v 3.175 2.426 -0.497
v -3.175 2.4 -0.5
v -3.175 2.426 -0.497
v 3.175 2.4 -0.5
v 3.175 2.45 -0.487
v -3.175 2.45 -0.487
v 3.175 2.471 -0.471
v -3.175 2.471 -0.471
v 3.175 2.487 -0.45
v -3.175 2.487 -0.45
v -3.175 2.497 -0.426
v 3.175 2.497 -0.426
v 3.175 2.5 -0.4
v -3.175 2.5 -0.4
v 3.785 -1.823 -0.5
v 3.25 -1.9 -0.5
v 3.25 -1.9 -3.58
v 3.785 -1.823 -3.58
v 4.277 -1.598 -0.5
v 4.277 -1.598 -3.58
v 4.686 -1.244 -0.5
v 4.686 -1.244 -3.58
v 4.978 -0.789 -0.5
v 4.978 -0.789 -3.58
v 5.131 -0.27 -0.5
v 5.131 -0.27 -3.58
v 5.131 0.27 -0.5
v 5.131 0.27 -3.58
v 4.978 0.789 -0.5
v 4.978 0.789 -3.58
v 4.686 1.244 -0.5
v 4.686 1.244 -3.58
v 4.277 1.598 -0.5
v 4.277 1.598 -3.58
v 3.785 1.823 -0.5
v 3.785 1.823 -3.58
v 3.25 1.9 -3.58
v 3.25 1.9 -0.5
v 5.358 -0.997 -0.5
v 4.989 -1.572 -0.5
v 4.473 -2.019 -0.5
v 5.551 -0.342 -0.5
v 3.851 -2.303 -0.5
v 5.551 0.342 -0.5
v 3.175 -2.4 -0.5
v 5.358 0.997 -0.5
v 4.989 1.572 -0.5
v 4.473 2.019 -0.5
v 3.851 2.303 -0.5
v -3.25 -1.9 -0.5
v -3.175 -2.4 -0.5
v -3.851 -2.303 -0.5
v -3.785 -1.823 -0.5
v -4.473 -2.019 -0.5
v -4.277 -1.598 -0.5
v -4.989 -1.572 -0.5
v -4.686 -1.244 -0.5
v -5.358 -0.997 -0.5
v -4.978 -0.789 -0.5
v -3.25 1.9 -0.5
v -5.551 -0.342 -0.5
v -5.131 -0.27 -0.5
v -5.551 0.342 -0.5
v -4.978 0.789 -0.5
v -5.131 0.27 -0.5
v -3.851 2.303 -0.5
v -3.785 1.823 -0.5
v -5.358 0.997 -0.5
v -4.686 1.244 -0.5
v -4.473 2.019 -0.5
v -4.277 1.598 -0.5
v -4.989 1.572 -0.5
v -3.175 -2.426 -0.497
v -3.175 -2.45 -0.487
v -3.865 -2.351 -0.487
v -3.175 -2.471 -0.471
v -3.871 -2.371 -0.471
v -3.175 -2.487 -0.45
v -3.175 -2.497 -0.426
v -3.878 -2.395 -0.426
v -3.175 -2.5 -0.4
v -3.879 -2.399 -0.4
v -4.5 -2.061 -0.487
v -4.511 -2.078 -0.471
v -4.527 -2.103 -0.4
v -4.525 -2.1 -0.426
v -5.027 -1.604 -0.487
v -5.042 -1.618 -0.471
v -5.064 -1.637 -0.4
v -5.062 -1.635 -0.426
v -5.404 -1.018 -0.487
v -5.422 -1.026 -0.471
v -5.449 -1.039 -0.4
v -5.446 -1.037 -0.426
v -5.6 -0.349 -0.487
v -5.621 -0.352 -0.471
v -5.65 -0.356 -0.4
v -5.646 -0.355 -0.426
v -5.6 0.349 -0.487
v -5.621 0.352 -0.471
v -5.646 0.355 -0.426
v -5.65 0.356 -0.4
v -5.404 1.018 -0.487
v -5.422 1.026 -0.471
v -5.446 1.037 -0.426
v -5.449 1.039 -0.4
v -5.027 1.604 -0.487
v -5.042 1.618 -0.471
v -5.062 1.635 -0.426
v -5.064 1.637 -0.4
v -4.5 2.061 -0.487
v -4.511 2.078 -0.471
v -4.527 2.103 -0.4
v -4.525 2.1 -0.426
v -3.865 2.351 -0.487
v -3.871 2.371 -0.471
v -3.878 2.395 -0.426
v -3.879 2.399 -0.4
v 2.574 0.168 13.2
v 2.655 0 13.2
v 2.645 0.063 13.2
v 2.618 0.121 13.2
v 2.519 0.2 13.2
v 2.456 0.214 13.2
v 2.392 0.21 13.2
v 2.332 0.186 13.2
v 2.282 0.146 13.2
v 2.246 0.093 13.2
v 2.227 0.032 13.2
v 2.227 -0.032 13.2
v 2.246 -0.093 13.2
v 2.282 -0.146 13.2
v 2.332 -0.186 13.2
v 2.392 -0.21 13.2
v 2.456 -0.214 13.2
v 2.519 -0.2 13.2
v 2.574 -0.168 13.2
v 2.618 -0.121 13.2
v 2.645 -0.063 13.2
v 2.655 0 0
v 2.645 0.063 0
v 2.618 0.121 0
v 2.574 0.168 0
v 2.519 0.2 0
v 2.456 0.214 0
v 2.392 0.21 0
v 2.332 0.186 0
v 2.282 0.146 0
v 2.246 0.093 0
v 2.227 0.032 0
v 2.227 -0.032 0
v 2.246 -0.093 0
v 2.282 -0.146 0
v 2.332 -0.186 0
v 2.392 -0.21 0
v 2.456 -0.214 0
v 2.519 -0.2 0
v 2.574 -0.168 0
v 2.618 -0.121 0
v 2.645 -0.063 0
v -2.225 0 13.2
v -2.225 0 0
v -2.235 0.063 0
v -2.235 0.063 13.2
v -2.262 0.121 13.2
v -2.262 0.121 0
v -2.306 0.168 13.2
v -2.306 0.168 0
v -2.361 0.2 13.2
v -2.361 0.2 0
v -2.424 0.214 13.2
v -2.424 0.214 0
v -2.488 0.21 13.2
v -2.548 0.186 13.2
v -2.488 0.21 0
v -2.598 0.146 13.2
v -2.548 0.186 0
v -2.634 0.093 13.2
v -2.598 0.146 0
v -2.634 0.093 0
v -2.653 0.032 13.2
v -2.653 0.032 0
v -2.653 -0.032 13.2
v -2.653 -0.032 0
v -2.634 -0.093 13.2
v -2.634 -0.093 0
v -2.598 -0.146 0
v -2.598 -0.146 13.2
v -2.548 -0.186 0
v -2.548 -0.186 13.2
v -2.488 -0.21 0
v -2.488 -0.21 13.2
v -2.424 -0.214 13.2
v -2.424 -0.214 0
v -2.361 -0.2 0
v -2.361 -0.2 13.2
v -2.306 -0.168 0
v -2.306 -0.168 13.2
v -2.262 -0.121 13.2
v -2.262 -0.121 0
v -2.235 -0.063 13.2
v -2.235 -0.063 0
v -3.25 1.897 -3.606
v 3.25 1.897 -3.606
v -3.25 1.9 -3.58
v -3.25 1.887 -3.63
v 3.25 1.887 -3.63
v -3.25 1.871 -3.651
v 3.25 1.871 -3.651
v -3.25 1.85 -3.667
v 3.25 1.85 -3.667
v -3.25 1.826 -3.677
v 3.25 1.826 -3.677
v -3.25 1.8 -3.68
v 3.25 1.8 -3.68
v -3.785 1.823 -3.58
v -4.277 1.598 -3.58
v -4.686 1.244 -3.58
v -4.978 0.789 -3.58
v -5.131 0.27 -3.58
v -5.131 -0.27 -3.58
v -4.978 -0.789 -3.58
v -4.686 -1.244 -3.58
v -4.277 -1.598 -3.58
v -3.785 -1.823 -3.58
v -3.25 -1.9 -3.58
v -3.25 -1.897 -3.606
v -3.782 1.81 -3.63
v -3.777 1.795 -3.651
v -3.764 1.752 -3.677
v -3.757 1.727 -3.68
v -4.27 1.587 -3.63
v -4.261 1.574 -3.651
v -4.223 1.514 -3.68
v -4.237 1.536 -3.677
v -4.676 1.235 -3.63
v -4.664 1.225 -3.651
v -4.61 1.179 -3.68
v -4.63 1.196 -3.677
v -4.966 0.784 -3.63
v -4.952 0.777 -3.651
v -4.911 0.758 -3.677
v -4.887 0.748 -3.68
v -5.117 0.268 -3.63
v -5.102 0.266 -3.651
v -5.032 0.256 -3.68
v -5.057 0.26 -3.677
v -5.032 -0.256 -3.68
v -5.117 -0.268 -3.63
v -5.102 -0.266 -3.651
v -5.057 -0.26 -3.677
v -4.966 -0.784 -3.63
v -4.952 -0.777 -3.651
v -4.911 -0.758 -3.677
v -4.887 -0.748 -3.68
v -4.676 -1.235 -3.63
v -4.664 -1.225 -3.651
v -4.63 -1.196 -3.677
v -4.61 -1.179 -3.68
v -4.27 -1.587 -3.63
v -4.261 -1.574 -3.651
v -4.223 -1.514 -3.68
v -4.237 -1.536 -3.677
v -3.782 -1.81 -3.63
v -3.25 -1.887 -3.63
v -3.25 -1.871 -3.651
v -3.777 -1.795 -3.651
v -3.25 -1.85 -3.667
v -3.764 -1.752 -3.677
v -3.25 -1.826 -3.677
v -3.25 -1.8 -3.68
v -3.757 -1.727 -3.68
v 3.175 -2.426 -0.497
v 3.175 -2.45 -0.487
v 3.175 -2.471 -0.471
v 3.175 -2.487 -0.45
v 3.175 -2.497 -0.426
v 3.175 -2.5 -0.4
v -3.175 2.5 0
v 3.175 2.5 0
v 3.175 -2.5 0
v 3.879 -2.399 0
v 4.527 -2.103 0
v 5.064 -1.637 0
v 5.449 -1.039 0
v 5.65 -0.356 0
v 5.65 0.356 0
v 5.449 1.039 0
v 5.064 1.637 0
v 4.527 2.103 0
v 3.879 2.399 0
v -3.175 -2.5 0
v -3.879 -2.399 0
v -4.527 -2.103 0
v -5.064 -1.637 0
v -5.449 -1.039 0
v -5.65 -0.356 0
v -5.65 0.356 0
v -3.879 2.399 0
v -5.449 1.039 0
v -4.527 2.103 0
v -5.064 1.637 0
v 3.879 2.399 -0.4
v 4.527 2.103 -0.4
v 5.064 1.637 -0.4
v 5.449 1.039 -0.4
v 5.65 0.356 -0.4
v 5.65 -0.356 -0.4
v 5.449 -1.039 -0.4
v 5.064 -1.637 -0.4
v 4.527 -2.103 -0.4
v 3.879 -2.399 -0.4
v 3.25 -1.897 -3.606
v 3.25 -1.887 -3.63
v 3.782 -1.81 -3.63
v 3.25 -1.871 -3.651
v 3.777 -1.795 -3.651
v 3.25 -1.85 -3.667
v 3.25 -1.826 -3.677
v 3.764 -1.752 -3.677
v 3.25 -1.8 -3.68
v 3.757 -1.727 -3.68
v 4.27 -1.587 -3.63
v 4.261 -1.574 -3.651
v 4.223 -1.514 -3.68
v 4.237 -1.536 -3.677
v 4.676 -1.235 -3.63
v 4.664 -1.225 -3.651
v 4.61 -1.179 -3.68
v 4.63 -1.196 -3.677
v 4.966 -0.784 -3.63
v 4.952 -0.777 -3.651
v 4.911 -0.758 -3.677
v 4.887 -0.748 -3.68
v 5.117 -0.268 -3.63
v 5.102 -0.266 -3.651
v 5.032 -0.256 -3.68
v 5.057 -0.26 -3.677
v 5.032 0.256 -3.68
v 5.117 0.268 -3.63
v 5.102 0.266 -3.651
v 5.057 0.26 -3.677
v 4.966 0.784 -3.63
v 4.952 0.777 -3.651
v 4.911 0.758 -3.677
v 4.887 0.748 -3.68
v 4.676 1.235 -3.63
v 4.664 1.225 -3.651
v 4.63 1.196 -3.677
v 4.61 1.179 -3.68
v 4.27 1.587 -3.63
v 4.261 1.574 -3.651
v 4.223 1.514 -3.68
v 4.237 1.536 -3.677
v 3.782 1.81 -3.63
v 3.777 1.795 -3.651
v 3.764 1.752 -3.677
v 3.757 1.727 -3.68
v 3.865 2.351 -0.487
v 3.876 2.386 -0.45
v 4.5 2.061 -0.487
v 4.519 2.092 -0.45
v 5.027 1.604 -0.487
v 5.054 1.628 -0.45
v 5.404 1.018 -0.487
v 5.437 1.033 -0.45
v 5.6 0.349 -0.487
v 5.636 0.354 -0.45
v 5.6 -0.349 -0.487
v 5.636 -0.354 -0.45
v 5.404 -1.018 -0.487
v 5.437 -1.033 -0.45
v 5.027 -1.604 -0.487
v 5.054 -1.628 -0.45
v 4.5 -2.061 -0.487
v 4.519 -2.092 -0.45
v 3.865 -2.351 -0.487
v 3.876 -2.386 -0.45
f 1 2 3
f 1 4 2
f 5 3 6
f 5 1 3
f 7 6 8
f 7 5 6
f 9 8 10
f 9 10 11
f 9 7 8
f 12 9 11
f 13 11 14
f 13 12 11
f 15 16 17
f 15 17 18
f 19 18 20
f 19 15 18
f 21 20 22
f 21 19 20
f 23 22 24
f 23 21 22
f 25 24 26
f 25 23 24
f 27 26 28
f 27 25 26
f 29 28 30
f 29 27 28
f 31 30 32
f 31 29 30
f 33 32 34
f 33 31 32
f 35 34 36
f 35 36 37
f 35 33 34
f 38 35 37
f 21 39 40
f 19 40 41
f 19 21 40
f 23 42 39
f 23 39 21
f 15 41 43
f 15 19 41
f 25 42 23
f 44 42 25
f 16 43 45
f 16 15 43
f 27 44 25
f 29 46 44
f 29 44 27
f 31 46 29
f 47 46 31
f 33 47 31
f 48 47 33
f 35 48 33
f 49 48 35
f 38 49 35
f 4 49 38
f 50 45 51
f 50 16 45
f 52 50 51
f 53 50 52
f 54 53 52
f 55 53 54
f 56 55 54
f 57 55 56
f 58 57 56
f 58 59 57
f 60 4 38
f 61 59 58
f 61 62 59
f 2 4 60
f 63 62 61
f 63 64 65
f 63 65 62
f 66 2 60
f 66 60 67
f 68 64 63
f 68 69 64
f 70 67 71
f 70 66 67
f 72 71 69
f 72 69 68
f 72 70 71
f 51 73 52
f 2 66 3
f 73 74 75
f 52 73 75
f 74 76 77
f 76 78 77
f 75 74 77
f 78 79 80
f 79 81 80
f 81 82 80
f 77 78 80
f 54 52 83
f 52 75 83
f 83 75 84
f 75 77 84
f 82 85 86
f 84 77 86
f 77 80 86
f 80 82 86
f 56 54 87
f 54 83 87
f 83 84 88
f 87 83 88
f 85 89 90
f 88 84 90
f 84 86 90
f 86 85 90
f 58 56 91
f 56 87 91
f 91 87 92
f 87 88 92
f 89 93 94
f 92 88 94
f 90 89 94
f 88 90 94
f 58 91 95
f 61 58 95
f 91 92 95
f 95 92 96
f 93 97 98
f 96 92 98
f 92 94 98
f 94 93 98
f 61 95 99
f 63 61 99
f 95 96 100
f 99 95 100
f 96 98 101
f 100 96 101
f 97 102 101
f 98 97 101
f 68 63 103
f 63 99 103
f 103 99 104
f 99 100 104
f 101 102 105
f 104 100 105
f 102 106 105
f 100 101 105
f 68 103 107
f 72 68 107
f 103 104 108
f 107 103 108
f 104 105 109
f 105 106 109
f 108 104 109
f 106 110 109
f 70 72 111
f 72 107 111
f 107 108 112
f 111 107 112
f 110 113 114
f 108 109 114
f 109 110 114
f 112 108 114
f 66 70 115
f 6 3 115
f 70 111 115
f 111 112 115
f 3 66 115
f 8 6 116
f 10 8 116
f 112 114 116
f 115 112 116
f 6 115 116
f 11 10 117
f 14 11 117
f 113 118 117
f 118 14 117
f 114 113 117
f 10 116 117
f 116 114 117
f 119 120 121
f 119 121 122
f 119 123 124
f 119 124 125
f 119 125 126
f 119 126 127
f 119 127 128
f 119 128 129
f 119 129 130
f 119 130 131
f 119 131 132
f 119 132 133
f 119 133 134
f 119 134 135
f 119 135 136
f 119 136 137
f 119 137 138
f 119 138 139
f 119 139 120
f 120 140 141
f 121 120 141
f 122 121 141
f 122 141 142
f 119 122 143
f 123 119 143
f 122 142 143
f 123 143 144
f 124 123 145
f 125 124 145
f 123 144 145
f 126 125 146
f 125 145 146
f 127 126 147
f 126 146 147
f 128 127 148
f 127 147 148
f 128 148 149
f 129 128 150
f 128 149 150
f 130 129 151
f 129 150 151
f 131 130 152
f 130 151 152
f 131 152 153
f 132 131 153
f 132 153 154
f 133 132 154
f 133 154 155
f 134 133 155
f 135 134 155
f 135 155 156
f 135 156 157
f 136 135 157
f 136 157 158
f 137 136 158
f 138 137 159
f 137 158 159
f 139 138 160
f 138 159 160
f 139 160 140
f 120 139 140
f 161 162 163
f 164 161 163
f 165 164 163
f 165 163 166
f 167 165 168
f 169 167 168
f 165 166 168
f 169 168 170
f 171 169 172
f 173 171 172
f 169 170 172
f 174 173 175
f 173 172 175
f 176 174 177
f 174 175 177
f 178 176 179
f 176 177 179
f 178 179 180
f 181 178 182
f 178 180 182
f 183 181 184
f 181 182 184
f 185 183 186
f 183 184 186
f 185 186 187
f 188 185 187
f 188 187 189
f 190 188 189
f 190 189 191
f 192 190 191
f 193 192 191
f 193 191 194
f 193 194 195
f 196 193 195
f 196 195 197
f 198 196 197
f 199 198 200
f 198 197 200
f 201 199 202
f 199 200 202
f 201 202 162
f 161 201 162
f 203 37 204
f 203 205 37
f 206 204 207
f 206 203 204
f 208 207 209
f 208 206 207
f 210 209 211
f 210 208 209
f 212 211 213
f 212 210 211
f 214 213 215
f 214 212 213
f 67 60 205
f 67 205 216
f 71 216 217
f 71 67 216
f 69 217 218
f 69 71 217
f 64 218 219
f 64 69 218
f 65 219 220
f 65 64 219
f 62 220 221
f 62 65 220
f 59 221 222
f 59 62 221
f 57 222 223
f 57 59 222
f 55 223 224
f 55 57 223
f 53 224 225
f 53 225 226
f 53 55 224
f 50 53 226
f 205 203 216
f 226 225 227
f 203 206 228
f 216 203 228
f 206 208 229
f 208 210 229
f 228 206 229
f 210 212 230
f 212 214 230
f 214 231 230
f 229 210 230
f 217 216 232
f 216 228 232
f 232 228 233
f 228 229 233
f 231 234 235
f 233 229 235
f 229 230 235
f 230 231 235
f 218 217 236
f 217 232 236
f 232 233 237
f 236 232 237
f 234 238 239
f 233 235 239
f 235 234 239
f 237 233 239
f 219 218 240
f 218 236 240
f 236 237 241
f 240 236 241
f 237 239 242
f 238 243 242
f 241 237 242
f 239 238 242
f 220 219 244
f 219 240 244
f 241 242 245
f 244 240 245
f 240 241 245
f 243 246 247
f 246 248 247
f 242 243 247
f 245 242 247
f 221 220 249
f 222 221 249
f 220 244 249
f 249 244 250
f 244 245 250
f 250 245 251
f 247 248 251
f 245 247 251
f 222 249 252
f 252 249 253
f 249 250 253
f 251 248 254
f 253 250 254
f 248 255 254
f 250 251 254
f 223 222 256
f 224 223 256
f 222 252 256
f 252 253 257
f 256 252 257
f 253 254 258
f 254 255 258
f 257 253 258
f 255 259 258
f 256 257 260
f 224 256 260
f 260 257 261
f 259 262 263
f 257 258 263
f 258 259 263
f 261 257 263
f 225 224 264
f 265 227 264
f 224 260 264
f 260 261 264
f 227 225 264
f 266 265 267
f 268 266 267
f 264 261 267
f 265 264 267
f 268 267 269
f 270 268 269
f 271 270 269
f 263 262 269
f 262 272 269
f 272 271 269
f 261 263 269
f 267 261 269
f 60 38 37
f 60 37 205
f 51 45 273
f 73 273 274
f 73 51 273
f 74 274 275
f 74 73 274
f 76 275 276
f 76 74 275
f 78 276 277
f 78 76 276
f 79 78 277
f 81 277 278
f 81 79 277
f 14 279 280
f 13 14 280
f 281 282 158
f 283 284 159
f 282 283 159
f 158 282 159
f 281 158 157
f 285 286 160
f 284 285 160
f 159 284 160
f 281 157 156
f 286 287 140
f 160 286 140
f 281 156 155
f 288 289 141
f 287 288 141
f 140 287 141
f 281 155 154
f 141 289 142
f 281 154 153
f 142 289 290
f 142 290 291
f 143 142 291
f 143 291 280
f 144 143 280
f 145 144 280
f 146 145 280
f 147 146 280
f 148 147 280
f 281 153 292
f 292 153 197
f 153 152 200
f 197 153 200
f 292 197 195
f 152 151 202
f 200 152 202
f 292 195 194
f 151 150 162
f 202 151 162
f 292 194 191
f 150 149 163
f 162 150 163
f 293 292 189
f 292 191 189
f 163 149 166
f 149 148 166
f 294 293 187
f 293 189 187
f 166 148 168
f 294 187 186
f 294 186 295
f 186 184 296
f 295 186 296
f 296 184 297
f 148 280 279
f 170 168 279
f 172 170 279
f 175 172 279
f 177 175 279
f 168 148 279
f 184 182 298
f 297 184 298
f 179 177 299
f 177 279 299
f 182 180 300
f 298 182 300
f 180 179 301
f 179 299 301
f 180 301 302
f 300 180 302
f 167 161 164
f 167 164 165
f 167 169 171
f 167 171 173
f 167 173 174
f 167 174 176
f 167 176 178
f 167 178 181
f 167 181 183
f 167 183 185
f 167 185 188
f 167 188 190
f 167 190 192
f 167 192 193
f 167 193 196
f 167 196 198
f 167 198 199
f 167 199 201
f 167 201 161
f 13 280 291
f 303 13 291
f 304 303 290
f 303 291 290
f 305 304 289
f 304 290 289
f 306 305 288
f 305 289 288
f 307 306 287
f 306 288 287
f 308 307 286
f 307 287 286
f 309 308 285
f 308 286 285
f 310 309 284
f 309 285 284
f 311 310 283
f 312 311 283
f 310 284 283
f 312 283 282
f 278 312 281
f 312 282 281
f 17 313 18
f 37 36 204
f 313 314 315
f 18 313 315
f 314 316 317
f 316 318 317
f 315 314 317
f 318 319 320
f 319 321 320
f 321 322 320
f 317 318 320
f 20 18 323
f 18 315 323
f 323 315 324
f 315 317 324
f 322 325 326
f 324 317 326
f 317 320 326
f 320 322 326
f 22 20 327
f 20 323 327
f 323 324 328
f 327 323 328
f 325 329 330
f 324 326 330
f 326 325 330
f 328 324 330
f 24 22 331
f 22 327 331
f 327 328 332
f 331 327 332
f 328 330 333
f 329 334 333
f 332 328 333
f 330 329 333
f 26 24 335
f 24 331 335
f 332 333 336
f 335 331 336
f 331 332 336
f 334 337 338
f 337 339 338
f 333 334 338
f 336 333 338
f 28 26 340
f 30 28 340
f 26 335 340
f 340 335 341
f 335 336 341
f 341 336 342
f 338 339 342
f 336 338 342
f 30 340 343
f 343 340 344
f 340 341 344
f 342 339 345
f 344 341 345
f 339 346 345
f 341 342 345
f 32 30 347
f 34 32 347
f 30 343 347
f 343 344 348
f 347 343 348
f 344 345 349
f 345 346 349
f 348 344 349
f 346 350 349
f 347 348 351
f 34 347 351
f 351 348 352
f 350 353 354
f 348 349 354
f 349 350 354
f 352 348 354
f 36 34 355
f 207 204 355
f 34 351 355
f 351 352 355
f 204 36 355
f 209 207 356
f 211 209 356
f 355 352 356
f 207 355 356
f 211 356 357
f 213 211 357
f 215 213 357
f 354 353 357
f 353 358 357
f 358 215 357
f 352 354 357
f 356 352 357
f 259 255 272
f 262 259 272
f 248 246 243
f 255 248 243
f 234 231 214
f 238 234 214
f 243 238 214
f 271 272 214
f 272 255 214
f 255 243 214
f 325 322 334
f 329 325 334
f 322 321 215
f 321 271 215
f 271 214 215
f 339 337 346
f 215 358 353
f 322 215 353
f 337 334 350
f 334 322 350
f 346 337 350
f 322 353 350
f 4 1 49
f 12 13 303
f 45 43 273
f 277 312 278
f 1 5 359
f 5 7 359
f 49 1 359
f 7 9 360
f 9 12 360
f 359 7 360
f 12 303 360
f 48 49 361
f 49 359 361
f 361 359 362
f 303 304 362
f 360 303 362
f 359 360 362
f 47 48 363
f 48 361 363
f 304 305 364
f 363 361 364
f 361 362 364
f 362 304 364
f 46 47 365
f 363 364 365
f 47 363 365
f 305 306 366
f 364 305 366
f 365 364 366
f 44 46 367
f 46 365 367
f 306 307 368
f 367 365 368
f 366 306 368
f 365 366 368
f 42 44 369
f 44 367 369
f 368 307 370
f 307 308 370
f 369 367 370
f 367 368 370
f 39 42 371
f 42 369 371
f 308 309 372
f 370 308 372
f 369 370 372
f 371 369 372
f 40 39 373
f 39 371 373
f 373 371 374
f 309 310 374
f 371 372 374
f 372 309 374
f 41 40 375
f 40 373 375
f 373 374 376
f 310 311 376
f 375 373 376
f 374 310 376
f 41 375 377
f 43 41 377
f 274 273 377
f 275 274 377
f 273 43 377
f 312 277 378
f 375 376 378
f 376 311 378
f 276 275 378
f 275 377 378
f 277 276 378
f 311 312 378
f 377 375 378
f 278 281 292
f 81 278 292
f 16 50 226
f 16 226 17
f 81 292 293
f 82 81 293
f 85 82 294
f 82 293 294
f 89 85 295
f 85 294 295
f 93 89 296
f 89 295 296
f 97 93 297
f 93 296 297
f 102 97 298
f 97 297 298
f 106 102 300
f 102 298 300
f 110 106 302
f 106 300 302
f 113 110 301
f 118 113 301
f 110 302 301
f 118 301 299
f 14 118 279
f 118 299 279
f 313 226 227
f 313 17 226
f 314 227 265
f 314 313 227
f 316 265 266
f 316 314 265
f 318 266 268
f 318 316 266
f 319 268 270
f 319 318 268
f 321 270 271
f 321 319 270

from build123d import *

# Parameters (mm, degrees)
BOSS_EXTRUDE1_DEPTH = 0.5
BOSS_EXTRUDE2_DEPTH = 3.18
SKETCH4_R           = 0.215
BOSS_EXTRUDE3_DEPTH = 13.2
FILLET5_R           = 0.1
FILLET6_R           = 0.1


with BuildPart() as part:
    # Sketch1 → Boss-Extrude1 (new body)
    with BuildSketch(Plane.XY):
        with BuildLine():
            Line((-3.175, 2.5), (3.175, 2.5))
            ThreePointArc((3.175, 2.5), (5.675, 0), (3.175, -2.5))
            Line((3.175, -2.5), (-3.175, -2.5))
            ThreePointArc((-3.175, -2.5), (-5.675, 0), (-3.175, 2.5))
        make_face()
    extrude(amount=-BOSS_EXTRUDE1_DEPTH)

    # Sketch3 → Boss-Extrude2 (add)
    with BuildSketch(Plane(origin=(0, 0, -0.5), x_dir=(-1, 0, 0), z_dir=(0, 0, -1))):
        with BuildLine():
            Line((-3.25, 1.9), (3.25, 1.9))
            ThreePointArc((3.25, 1.9), (5.15, 0), (3.25, -1.9))
            Line((3.25, -1.9), (-3.25, -1.9))
            ThreePointArc((-3.25, -1.9), (-5.15, 0), (-3.25, 1.9))
        make_face()
    extrude(amount=BOSS_EXTRUDE2_DEPTH)

    # Sketch4 → Boss-Extrude3 (add)
    with BuildSketch(Plane.XY):
        with Locations((-2.44, 0)):
            Circle(SKETCH4_R)
        with Locations((2.44, 0)):
            Circle(SKETCH4_R)
    extrude(amount=BOSS_EXTRUDE3_DEPTH)

    # Fillet5
    fillet5_edges = [part.edges().sort_by_distance(p)[0] for p in [
        (5.15, 0, -3.68),
        (0, -1.9, -3.68),
        (-5.15, 0, -3.68),
        (0, 1.9, -3.68),
    ]]
    fillet(fillet5_edges, radius=FILLET5_R)

    # Fillet6
    fillet6_edges = [part.edges().sort_by_distance(p)[0] for p in [
        (5.675, 0, -0.5),
        (0, 2.5, -0.5),
        (-5.675, 0, -0.5),
        (0, -2.5, -0.5),
    ]]
    fillet(fillet6_edges, radius=FILLET6_R)


solid = part.part
